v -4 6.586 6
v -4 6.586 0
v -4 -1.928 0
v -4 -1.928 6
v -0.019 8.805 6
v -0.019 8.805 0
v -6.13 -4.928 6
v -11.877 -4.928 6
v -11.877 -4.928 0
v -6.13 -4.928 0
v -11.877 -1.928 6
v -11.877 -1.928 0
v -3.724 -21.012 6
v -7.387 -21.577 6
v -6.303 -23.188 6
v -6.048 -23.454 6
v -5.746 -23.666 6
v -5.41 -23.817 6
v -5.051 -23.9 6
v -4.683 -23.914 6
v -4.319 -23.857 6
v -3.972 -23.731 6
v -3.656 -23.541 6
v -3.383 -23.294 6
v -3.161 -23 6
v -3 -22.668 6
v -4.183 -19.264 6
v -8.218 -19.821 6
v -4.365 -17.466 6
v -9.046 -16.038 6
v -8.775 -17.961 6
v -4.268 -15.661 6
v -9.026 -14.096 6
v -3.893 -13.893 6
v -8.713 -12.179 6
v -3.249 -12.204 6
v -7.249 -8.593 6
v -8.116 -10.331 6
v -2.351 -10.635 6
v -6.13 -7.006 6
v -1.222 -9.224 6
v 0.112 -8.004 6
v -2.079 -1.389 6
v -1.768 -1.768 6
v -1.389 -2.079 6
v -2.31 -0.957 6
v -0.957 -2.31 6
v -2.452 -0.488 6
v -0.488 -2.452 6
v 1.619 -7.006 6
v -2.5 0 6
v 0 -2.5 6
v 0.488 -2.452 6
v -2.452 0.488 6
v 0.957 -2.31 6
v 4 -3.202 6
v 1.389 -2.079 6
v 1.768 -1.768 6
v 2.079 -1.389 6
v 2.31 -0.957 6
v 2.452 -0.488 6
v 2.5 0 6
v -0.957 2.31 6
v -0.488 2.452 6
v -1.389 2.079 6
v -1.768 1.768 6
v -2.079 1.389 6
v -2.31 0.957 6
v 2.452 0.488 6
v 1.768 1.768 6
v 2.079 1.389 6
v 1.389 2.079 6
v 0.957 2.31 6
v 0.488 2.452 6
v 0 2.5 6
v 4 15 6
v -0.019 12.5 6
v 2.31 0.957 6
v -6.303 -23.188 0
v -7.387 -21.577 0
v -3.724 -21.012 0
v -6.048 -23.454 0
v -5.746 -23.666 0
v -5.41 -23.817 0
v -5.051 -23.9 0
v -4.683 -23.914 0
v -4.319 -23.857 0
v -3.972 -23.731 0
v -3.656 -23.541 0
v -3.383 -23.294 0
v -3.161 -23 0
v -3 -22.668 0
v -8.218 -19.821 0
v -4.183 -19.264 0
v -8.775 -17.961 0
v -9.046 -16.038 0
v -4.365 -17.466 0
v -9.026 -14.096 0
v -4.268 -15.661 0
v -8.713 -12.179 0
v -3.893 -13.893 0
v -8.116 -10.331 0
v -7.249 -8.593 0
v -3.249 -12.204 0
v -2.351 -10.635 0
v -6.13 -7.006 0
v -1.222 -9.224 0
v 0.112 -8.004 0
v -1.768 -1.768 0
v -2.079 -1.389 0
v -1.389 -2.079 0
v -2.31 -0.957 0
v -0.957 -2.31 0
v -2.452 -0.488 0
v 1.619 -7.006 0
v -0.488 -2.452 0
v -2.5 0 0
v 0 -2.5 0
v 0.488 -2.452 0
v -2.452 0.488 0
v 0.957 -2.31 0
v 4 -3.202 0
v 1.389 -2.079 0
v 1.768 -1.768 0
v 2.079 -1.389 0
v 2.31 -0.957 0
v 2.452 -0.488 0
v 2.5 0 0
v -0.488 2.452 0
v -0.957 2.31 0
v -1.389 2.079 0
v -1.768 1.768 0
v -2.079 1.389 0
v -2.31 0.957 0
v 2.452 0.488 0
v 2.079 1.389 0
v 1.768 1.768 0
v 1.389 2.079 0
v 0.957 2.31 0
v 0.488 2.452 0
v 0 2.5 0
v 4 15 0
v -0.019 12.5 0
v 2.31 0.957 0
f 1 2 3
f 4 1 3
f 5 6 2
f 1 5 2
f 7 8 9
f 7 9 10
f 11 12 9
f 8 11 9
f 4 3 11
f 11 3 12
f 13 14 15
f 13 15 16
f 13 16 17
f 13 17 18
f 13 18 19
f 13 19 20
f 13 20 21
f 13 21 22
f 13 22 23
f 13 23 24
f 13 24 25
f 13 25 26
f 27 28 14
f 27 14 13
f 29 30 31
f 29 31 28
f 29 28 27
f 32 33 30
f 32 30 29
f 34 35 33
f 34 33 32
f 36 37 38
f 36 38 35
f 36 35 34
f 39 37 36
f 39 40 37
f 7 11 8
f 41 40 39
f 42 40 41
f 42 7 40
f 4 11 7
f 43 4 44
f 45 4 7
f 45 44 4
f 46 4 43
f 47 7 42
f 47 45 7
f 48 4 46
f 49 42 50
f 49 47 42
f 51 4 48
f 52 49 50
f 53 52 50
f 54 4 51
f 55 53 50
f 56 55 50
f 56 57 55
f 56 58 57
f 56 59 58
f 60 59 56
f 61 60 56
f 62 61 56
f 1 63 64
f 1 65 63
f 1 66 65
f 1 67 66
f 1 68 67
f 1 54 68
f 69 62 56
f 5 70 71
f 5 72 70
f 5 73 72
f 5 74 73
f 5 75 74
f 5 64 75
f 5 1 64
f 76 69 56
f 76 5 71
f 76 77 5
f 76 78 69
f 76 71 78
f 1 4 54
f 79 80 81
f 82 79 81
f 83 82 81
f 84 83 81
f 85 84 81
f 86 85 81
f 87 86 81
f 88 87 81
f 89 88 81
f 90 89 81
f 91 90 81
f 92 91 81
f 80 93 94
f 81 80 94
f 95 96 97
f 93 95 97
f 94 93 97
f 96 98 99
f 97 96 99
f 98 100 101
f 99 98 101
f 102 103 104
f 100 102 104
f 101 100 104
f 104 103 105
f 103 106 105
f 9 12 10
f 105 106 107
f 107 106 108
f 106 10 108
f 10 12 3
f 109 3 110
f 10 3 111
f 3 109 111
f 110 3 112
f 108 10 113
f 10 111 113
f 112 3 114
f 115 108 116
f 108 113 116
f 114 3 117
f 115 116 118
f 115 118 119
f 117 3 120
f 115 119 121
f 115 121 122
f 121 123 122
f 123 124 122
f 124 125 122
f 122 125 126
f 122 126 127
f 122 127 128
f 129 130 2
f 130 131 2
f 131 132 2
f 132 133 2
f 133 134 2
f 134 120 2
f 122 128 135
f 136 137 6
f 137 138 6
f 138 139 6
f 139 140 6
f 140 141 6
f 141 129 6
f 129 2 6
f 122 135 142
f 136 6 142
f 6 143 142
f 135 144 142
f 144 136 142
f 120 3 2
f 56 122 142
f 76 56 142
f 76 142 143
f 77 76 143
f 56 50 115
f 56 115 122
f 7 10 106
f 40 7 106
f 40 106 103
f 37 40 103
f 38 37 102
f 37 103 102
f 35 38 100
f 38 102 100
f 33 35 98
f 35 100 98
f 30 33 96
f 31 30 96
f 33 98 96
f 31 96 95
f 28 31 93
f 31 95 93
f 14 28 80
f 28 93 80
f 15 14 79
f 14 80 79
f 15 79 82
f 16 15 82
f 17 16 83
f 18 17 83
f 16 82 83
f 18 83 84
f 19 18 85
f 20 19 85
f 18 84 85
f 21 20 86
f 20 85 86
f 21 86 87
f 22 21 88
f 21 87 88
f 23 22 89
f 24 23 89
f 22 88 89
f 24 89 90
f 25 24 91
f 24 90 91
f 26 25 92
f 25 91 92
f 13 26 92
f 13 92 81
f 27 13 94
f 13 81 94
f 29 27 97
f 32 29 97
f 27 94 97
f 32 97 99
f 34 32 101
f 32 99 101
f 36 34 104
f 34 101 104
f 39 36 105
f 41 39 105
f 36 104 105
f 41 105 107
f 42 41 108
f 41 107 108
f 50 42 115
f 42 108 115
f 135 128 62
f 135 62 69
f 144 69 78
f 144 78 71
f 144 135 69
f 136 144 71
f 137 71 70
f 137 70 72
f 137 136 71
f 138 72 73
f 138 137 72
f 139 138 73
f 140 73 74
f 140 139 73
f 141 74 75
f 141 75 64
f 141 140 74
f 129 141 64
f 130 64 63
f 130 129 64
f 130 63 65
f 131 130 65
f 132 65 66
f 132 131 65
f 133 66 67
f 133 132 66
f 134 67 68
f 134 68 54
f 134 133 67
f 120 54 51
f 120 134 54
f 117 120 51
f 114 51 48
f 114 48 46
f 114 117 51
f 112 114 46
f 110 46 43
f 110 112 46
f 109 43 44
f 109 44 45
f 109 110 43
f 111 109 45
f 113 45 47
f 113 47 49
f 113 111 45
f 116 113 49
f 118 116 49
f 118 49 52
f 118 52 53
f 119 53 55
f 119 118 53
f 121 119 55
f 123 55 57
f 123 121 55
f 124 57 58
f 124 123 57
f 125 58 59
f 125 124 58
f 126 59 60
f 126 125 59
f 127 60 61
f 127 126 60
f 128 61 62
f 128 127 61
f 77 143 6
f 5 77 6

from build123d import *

# Parameters (mm, degrees)
SKETCH_1_R      = 4
SKETCH_1_R_2    = 2.5
EXTRUDE_1_DEPTH = 6


with BuildPart() as part:
    # 스케치1 → 보스-돌출1 (new body)
    # profile 1 of 4: a face of its own
    with BuildSketch(Plane.XY):
        with BuildLine():
            Line((4, -3.202328983), (4, 0))
            ThreePointArc((4, 0), (-3e-09, -4), (-4, 6e-09))
            Line((-4, 6e-09), (-4, -1.928017797))
            Line((-4, -1.928017797), (-11.877068301, -1.928017797))
            Line((-11.877068301, -1.928017797), (-11.877068301, -4.928017797))
            Line((-11.877068301, -4.928017797), (-6.12956889, -4.928017797))
            Line((-6.12956889, -4.928017797), (-6.12956889, -7.005884989))
            Line((-6.12956889, -7.005884989), (1.618982626, -7.005884989))
            Line((1.618982626, -7.005884989), (4, -3.202328983))
        make_face()
    # profile 2 of 4: a face of its own
    with BuildSketch(Plane.XY):
        Circle(SKETCH_1_R)
        Circle(SKETCH_1_R_2, mode=Mode.SUBTRACT)
    # profile 3 of 4: a face of its own
    with BuildSketch(Plane.XY):
        with BuildLine():
            Line((4, 15), (-0.018657753, 12.499853249))
            Line((-0.018657753, 12.499853249), (-0.018657753, 8.804925293))
            Line((-0.018657753, 8.804925293), (-4, 6.585919306))
            Line((-4, 6.585919306), (-4, 6e-09))
            ThreePointArc((-4, 6e-09), (3e-09, 4), (4, 0))
            Line((4, 0), (4, 15))
        make_face()
    # profile 4 of 4: a face of its own
    with BuildSketch(Plane.XY):
        with BuildLine():
            ThreePointArc((-6.12956889, -7.005884989), (-9.072577994, -15.066190234), (-6.302707776, -23.187621278))
            ThreePointArc((-6.302707776, -23.187621278), (-4.499421911, -23.894054073), (-2.999999998, -22.668239597))
            ThreePointArc((-2.999999998, -22.668239597), (-3.892893232, -13.892647551), (1.618982626, -7.005884989))
            Line((1.618982626, -7.005884989), (-6.12956889, -7.005884989))
        make_face()
    extrude(amount=EXTRUDE_1_DEPTH)


solid = part.part
